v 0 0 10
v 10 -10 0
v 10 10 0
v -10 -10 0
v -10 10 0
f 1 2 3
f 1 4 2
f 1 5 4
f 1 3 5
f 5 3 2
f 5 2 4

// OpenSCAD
polyhedron(
  points=[ 
    [10,10,0],
    [10,-10,0],
    [-10,-10,0],
    [-10,10,0],
    [0,0,10]  
  ],
  triangles=[ 
    [0,1,4],
    [1,2,4],
    [2,3,4],
    [3,0,4],
    [1,0,3],
    [2,1,3] 
  ]
 );
